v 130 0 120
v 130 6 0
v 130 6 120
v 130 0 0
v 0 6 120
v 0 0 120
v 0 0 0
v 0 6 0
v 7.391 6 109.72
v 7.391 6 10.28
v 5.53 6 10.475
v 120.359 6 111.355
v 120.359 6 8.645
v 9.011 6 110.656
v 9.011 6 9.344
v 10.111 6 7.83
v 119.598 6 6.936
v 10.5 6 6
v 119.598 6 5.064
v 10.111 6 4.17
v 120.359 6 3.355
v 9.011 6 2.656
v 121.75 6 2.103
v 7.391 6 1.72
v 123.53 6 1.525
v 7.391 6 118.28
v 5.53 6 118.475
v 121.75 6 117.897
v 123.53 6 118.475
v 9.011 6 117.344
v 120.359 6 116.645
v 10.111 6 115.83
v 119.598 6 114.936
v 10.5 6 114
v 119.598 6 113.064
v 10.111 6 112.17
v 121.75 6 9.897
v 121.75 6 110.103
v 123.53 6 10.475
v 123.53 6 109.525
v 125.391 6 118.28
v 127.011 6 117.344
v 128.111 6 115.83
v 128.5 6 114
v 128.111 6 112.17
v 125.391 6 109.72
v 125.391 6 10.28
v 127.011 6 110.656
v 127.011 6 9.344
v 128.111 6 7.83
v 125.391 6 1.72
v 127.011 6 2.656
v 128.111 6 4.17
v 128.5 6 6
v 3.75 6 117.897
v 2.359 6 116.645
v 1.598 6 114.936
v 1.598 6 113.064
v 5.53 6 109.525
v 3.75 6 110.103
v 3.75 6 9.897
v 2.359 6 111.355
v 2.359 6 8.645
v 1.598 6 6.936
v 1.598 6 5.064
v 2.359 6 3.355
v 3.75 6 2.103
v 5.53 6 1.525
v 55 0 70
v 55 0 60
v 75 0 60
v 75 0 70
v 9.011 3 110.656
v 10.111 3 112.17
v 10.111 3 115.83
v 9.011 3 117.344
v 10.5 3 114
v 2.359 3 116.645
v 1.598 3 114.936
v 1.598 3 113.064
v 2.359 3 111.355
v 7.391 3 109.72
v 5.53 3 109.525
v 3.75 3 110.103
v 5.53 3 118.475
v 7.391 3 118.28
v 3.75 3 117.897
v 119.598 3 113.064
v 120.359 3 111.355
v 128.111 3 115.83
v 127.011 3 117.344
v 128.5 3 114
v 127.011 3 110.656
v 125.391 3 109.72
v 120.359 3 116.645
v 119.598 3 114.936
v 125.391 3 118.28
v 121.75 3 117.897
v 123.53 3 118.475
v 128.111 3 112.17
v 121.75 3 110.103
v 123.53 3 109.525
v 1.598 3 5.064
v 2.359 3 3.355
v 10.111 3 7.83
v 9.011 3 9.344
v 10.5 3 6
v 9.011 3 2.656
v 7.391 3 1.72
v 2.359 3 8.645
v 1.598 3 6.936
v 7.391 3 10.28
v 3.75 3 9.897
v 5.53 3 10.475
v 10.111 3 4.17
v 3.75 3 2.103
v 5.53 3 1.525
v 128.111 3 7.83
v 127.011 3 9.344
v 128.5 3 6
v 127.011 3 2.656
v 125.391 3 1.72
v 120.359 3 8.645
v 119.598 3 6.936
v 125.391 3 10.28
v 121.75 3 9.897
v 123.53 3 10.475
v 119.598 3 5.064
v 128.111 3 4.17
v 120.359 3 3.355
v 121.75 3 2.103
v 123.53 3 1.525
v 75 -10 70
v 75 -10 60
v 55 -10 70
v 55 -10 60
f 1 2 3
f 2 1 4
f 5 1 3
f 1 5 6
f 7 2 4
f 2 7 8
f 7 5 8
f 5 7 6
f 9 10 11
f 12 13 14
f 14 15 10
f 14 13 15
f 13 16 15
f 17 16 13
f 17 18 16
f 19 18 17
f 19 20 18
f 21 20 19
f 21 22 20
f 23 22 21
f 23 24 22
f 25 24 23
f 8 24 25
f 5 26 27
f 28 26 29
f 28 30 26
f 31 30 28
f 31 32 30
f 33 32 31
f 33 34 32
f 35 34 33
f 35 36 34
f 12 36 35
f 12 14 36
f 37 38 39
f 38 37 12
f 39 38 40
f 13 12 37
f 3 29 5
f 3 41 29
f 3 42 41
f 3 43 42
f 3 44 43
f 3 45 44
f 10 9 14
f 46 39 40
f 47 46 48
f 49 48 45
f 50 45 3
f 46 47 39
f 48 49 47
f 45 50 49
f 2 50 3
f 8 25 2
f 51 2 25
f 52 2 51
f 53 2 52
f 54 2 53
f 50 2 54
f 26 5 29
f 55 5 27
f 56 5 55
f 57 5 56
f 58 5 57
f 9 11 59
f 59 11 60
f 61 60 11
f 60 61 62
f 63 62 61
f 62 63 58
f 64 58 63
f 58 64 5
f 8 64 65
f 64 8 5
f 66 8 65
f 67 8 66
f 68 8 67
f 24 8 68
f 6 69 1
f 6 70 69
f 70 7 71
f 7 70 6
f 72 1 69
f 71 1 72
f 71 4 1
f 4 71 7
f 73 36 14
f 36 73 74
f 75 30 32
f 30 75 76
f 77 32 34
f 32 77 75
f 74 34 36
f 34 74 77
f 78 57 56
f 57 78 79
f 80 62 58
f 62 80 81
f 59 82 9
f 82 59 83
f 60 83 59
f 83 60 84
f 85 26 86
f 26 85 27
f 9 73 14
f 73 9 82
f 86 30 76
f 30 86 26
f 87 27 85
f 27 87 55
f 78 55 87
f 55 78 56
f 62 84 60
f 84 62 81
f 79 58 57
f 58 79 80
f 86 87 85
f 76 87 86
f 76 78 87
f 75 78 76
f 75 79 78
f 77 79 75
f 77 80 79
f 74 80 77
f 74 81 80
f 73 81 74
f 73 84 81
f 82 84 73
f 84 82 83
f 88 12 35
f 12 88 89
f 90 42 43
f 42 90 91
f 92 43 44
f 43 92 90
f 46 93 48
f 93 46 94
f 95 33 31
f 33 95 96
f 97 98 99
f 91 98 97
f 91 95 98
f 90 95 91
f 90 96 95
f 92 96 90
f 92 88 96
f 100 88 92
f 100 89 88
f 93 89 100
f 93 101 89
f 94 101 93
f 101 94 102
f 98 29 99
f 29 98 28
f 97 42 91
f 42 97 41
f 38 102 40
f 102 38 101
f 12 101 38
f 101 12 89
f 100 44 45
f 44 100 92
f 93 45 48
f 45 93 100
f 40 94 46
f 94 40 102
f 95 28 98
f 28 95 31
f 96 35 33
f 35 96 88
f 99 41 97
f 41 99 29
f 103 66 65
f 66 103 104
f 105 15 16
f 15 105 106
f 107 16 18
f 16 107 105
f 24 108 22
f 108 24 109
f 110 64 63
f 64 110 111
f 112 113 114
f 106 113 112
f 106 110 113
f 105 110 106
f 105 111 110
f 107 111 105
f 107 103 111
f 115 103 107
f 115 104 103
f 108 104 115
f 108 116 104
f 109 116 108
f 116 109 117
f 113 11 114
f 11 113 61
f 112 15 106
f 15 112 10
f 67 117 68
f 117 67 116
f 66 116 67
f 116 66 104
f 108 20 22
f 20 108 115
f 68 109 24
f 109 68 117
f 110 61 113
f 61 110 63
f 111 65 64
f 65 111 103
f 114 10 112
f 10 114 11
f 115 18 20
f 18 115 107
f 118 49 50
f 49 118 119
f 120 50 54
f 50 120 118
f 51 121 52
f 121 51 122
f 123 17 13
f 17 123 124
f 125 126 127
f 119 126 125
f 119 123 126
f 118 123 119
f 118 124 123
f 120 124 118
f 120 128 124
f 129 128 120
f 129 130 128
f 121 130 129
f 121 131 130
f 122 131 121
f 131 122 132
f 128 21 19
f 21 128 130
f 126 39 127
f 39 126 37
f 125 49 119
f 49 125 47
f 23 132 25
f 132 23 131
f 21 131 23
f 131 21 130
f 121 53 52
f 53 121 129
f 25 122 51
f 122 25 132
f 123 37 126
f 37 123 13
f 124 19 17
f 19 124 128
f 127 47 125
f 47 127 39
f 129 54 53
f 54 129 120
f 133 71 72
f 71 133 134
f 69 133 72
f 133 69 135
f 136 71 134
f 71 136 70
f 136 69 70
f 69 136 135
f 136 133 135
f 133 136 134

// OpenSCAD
BoxH=120;
BoxW=130;
BoxD=6;
MagnetD=9;
MagnetH=4;
MagnetR=ceil(MagnetD/2)+1;
KnobH=10;
KnobW=20;
KnobD=10;
difference()
{
  cube([BoxW,BoxD,BoxH]);
  translate([MagnetR,BoxD+1,BoxH-MagnetR]) rotate([90,0,0])
    cylinder(d=MagnetD,h=MagnetH);
  translate([BoxW-MagnetR,BoxD+1,BoxH-MagnetR]) rotate([90,0,0])
    cylinder(d=MagnetD, h=MagnetH);
  translate([MagnetR,BoxD+1,MagnetR]) rotate([90,0,0])
    cylinder(d=MagnetD,h=MagnetH);
  translate([BoxW-MagnetR,BoxD+1,MagnetR]) rotate([90,0,0])
    cylinder(d=MagnetD, h=MagnetH);  
}
translate([BoxW/2-KnobW/2,-KnobD,BoxH/2]) cube([KnobW,KnobD,KnobH]);
